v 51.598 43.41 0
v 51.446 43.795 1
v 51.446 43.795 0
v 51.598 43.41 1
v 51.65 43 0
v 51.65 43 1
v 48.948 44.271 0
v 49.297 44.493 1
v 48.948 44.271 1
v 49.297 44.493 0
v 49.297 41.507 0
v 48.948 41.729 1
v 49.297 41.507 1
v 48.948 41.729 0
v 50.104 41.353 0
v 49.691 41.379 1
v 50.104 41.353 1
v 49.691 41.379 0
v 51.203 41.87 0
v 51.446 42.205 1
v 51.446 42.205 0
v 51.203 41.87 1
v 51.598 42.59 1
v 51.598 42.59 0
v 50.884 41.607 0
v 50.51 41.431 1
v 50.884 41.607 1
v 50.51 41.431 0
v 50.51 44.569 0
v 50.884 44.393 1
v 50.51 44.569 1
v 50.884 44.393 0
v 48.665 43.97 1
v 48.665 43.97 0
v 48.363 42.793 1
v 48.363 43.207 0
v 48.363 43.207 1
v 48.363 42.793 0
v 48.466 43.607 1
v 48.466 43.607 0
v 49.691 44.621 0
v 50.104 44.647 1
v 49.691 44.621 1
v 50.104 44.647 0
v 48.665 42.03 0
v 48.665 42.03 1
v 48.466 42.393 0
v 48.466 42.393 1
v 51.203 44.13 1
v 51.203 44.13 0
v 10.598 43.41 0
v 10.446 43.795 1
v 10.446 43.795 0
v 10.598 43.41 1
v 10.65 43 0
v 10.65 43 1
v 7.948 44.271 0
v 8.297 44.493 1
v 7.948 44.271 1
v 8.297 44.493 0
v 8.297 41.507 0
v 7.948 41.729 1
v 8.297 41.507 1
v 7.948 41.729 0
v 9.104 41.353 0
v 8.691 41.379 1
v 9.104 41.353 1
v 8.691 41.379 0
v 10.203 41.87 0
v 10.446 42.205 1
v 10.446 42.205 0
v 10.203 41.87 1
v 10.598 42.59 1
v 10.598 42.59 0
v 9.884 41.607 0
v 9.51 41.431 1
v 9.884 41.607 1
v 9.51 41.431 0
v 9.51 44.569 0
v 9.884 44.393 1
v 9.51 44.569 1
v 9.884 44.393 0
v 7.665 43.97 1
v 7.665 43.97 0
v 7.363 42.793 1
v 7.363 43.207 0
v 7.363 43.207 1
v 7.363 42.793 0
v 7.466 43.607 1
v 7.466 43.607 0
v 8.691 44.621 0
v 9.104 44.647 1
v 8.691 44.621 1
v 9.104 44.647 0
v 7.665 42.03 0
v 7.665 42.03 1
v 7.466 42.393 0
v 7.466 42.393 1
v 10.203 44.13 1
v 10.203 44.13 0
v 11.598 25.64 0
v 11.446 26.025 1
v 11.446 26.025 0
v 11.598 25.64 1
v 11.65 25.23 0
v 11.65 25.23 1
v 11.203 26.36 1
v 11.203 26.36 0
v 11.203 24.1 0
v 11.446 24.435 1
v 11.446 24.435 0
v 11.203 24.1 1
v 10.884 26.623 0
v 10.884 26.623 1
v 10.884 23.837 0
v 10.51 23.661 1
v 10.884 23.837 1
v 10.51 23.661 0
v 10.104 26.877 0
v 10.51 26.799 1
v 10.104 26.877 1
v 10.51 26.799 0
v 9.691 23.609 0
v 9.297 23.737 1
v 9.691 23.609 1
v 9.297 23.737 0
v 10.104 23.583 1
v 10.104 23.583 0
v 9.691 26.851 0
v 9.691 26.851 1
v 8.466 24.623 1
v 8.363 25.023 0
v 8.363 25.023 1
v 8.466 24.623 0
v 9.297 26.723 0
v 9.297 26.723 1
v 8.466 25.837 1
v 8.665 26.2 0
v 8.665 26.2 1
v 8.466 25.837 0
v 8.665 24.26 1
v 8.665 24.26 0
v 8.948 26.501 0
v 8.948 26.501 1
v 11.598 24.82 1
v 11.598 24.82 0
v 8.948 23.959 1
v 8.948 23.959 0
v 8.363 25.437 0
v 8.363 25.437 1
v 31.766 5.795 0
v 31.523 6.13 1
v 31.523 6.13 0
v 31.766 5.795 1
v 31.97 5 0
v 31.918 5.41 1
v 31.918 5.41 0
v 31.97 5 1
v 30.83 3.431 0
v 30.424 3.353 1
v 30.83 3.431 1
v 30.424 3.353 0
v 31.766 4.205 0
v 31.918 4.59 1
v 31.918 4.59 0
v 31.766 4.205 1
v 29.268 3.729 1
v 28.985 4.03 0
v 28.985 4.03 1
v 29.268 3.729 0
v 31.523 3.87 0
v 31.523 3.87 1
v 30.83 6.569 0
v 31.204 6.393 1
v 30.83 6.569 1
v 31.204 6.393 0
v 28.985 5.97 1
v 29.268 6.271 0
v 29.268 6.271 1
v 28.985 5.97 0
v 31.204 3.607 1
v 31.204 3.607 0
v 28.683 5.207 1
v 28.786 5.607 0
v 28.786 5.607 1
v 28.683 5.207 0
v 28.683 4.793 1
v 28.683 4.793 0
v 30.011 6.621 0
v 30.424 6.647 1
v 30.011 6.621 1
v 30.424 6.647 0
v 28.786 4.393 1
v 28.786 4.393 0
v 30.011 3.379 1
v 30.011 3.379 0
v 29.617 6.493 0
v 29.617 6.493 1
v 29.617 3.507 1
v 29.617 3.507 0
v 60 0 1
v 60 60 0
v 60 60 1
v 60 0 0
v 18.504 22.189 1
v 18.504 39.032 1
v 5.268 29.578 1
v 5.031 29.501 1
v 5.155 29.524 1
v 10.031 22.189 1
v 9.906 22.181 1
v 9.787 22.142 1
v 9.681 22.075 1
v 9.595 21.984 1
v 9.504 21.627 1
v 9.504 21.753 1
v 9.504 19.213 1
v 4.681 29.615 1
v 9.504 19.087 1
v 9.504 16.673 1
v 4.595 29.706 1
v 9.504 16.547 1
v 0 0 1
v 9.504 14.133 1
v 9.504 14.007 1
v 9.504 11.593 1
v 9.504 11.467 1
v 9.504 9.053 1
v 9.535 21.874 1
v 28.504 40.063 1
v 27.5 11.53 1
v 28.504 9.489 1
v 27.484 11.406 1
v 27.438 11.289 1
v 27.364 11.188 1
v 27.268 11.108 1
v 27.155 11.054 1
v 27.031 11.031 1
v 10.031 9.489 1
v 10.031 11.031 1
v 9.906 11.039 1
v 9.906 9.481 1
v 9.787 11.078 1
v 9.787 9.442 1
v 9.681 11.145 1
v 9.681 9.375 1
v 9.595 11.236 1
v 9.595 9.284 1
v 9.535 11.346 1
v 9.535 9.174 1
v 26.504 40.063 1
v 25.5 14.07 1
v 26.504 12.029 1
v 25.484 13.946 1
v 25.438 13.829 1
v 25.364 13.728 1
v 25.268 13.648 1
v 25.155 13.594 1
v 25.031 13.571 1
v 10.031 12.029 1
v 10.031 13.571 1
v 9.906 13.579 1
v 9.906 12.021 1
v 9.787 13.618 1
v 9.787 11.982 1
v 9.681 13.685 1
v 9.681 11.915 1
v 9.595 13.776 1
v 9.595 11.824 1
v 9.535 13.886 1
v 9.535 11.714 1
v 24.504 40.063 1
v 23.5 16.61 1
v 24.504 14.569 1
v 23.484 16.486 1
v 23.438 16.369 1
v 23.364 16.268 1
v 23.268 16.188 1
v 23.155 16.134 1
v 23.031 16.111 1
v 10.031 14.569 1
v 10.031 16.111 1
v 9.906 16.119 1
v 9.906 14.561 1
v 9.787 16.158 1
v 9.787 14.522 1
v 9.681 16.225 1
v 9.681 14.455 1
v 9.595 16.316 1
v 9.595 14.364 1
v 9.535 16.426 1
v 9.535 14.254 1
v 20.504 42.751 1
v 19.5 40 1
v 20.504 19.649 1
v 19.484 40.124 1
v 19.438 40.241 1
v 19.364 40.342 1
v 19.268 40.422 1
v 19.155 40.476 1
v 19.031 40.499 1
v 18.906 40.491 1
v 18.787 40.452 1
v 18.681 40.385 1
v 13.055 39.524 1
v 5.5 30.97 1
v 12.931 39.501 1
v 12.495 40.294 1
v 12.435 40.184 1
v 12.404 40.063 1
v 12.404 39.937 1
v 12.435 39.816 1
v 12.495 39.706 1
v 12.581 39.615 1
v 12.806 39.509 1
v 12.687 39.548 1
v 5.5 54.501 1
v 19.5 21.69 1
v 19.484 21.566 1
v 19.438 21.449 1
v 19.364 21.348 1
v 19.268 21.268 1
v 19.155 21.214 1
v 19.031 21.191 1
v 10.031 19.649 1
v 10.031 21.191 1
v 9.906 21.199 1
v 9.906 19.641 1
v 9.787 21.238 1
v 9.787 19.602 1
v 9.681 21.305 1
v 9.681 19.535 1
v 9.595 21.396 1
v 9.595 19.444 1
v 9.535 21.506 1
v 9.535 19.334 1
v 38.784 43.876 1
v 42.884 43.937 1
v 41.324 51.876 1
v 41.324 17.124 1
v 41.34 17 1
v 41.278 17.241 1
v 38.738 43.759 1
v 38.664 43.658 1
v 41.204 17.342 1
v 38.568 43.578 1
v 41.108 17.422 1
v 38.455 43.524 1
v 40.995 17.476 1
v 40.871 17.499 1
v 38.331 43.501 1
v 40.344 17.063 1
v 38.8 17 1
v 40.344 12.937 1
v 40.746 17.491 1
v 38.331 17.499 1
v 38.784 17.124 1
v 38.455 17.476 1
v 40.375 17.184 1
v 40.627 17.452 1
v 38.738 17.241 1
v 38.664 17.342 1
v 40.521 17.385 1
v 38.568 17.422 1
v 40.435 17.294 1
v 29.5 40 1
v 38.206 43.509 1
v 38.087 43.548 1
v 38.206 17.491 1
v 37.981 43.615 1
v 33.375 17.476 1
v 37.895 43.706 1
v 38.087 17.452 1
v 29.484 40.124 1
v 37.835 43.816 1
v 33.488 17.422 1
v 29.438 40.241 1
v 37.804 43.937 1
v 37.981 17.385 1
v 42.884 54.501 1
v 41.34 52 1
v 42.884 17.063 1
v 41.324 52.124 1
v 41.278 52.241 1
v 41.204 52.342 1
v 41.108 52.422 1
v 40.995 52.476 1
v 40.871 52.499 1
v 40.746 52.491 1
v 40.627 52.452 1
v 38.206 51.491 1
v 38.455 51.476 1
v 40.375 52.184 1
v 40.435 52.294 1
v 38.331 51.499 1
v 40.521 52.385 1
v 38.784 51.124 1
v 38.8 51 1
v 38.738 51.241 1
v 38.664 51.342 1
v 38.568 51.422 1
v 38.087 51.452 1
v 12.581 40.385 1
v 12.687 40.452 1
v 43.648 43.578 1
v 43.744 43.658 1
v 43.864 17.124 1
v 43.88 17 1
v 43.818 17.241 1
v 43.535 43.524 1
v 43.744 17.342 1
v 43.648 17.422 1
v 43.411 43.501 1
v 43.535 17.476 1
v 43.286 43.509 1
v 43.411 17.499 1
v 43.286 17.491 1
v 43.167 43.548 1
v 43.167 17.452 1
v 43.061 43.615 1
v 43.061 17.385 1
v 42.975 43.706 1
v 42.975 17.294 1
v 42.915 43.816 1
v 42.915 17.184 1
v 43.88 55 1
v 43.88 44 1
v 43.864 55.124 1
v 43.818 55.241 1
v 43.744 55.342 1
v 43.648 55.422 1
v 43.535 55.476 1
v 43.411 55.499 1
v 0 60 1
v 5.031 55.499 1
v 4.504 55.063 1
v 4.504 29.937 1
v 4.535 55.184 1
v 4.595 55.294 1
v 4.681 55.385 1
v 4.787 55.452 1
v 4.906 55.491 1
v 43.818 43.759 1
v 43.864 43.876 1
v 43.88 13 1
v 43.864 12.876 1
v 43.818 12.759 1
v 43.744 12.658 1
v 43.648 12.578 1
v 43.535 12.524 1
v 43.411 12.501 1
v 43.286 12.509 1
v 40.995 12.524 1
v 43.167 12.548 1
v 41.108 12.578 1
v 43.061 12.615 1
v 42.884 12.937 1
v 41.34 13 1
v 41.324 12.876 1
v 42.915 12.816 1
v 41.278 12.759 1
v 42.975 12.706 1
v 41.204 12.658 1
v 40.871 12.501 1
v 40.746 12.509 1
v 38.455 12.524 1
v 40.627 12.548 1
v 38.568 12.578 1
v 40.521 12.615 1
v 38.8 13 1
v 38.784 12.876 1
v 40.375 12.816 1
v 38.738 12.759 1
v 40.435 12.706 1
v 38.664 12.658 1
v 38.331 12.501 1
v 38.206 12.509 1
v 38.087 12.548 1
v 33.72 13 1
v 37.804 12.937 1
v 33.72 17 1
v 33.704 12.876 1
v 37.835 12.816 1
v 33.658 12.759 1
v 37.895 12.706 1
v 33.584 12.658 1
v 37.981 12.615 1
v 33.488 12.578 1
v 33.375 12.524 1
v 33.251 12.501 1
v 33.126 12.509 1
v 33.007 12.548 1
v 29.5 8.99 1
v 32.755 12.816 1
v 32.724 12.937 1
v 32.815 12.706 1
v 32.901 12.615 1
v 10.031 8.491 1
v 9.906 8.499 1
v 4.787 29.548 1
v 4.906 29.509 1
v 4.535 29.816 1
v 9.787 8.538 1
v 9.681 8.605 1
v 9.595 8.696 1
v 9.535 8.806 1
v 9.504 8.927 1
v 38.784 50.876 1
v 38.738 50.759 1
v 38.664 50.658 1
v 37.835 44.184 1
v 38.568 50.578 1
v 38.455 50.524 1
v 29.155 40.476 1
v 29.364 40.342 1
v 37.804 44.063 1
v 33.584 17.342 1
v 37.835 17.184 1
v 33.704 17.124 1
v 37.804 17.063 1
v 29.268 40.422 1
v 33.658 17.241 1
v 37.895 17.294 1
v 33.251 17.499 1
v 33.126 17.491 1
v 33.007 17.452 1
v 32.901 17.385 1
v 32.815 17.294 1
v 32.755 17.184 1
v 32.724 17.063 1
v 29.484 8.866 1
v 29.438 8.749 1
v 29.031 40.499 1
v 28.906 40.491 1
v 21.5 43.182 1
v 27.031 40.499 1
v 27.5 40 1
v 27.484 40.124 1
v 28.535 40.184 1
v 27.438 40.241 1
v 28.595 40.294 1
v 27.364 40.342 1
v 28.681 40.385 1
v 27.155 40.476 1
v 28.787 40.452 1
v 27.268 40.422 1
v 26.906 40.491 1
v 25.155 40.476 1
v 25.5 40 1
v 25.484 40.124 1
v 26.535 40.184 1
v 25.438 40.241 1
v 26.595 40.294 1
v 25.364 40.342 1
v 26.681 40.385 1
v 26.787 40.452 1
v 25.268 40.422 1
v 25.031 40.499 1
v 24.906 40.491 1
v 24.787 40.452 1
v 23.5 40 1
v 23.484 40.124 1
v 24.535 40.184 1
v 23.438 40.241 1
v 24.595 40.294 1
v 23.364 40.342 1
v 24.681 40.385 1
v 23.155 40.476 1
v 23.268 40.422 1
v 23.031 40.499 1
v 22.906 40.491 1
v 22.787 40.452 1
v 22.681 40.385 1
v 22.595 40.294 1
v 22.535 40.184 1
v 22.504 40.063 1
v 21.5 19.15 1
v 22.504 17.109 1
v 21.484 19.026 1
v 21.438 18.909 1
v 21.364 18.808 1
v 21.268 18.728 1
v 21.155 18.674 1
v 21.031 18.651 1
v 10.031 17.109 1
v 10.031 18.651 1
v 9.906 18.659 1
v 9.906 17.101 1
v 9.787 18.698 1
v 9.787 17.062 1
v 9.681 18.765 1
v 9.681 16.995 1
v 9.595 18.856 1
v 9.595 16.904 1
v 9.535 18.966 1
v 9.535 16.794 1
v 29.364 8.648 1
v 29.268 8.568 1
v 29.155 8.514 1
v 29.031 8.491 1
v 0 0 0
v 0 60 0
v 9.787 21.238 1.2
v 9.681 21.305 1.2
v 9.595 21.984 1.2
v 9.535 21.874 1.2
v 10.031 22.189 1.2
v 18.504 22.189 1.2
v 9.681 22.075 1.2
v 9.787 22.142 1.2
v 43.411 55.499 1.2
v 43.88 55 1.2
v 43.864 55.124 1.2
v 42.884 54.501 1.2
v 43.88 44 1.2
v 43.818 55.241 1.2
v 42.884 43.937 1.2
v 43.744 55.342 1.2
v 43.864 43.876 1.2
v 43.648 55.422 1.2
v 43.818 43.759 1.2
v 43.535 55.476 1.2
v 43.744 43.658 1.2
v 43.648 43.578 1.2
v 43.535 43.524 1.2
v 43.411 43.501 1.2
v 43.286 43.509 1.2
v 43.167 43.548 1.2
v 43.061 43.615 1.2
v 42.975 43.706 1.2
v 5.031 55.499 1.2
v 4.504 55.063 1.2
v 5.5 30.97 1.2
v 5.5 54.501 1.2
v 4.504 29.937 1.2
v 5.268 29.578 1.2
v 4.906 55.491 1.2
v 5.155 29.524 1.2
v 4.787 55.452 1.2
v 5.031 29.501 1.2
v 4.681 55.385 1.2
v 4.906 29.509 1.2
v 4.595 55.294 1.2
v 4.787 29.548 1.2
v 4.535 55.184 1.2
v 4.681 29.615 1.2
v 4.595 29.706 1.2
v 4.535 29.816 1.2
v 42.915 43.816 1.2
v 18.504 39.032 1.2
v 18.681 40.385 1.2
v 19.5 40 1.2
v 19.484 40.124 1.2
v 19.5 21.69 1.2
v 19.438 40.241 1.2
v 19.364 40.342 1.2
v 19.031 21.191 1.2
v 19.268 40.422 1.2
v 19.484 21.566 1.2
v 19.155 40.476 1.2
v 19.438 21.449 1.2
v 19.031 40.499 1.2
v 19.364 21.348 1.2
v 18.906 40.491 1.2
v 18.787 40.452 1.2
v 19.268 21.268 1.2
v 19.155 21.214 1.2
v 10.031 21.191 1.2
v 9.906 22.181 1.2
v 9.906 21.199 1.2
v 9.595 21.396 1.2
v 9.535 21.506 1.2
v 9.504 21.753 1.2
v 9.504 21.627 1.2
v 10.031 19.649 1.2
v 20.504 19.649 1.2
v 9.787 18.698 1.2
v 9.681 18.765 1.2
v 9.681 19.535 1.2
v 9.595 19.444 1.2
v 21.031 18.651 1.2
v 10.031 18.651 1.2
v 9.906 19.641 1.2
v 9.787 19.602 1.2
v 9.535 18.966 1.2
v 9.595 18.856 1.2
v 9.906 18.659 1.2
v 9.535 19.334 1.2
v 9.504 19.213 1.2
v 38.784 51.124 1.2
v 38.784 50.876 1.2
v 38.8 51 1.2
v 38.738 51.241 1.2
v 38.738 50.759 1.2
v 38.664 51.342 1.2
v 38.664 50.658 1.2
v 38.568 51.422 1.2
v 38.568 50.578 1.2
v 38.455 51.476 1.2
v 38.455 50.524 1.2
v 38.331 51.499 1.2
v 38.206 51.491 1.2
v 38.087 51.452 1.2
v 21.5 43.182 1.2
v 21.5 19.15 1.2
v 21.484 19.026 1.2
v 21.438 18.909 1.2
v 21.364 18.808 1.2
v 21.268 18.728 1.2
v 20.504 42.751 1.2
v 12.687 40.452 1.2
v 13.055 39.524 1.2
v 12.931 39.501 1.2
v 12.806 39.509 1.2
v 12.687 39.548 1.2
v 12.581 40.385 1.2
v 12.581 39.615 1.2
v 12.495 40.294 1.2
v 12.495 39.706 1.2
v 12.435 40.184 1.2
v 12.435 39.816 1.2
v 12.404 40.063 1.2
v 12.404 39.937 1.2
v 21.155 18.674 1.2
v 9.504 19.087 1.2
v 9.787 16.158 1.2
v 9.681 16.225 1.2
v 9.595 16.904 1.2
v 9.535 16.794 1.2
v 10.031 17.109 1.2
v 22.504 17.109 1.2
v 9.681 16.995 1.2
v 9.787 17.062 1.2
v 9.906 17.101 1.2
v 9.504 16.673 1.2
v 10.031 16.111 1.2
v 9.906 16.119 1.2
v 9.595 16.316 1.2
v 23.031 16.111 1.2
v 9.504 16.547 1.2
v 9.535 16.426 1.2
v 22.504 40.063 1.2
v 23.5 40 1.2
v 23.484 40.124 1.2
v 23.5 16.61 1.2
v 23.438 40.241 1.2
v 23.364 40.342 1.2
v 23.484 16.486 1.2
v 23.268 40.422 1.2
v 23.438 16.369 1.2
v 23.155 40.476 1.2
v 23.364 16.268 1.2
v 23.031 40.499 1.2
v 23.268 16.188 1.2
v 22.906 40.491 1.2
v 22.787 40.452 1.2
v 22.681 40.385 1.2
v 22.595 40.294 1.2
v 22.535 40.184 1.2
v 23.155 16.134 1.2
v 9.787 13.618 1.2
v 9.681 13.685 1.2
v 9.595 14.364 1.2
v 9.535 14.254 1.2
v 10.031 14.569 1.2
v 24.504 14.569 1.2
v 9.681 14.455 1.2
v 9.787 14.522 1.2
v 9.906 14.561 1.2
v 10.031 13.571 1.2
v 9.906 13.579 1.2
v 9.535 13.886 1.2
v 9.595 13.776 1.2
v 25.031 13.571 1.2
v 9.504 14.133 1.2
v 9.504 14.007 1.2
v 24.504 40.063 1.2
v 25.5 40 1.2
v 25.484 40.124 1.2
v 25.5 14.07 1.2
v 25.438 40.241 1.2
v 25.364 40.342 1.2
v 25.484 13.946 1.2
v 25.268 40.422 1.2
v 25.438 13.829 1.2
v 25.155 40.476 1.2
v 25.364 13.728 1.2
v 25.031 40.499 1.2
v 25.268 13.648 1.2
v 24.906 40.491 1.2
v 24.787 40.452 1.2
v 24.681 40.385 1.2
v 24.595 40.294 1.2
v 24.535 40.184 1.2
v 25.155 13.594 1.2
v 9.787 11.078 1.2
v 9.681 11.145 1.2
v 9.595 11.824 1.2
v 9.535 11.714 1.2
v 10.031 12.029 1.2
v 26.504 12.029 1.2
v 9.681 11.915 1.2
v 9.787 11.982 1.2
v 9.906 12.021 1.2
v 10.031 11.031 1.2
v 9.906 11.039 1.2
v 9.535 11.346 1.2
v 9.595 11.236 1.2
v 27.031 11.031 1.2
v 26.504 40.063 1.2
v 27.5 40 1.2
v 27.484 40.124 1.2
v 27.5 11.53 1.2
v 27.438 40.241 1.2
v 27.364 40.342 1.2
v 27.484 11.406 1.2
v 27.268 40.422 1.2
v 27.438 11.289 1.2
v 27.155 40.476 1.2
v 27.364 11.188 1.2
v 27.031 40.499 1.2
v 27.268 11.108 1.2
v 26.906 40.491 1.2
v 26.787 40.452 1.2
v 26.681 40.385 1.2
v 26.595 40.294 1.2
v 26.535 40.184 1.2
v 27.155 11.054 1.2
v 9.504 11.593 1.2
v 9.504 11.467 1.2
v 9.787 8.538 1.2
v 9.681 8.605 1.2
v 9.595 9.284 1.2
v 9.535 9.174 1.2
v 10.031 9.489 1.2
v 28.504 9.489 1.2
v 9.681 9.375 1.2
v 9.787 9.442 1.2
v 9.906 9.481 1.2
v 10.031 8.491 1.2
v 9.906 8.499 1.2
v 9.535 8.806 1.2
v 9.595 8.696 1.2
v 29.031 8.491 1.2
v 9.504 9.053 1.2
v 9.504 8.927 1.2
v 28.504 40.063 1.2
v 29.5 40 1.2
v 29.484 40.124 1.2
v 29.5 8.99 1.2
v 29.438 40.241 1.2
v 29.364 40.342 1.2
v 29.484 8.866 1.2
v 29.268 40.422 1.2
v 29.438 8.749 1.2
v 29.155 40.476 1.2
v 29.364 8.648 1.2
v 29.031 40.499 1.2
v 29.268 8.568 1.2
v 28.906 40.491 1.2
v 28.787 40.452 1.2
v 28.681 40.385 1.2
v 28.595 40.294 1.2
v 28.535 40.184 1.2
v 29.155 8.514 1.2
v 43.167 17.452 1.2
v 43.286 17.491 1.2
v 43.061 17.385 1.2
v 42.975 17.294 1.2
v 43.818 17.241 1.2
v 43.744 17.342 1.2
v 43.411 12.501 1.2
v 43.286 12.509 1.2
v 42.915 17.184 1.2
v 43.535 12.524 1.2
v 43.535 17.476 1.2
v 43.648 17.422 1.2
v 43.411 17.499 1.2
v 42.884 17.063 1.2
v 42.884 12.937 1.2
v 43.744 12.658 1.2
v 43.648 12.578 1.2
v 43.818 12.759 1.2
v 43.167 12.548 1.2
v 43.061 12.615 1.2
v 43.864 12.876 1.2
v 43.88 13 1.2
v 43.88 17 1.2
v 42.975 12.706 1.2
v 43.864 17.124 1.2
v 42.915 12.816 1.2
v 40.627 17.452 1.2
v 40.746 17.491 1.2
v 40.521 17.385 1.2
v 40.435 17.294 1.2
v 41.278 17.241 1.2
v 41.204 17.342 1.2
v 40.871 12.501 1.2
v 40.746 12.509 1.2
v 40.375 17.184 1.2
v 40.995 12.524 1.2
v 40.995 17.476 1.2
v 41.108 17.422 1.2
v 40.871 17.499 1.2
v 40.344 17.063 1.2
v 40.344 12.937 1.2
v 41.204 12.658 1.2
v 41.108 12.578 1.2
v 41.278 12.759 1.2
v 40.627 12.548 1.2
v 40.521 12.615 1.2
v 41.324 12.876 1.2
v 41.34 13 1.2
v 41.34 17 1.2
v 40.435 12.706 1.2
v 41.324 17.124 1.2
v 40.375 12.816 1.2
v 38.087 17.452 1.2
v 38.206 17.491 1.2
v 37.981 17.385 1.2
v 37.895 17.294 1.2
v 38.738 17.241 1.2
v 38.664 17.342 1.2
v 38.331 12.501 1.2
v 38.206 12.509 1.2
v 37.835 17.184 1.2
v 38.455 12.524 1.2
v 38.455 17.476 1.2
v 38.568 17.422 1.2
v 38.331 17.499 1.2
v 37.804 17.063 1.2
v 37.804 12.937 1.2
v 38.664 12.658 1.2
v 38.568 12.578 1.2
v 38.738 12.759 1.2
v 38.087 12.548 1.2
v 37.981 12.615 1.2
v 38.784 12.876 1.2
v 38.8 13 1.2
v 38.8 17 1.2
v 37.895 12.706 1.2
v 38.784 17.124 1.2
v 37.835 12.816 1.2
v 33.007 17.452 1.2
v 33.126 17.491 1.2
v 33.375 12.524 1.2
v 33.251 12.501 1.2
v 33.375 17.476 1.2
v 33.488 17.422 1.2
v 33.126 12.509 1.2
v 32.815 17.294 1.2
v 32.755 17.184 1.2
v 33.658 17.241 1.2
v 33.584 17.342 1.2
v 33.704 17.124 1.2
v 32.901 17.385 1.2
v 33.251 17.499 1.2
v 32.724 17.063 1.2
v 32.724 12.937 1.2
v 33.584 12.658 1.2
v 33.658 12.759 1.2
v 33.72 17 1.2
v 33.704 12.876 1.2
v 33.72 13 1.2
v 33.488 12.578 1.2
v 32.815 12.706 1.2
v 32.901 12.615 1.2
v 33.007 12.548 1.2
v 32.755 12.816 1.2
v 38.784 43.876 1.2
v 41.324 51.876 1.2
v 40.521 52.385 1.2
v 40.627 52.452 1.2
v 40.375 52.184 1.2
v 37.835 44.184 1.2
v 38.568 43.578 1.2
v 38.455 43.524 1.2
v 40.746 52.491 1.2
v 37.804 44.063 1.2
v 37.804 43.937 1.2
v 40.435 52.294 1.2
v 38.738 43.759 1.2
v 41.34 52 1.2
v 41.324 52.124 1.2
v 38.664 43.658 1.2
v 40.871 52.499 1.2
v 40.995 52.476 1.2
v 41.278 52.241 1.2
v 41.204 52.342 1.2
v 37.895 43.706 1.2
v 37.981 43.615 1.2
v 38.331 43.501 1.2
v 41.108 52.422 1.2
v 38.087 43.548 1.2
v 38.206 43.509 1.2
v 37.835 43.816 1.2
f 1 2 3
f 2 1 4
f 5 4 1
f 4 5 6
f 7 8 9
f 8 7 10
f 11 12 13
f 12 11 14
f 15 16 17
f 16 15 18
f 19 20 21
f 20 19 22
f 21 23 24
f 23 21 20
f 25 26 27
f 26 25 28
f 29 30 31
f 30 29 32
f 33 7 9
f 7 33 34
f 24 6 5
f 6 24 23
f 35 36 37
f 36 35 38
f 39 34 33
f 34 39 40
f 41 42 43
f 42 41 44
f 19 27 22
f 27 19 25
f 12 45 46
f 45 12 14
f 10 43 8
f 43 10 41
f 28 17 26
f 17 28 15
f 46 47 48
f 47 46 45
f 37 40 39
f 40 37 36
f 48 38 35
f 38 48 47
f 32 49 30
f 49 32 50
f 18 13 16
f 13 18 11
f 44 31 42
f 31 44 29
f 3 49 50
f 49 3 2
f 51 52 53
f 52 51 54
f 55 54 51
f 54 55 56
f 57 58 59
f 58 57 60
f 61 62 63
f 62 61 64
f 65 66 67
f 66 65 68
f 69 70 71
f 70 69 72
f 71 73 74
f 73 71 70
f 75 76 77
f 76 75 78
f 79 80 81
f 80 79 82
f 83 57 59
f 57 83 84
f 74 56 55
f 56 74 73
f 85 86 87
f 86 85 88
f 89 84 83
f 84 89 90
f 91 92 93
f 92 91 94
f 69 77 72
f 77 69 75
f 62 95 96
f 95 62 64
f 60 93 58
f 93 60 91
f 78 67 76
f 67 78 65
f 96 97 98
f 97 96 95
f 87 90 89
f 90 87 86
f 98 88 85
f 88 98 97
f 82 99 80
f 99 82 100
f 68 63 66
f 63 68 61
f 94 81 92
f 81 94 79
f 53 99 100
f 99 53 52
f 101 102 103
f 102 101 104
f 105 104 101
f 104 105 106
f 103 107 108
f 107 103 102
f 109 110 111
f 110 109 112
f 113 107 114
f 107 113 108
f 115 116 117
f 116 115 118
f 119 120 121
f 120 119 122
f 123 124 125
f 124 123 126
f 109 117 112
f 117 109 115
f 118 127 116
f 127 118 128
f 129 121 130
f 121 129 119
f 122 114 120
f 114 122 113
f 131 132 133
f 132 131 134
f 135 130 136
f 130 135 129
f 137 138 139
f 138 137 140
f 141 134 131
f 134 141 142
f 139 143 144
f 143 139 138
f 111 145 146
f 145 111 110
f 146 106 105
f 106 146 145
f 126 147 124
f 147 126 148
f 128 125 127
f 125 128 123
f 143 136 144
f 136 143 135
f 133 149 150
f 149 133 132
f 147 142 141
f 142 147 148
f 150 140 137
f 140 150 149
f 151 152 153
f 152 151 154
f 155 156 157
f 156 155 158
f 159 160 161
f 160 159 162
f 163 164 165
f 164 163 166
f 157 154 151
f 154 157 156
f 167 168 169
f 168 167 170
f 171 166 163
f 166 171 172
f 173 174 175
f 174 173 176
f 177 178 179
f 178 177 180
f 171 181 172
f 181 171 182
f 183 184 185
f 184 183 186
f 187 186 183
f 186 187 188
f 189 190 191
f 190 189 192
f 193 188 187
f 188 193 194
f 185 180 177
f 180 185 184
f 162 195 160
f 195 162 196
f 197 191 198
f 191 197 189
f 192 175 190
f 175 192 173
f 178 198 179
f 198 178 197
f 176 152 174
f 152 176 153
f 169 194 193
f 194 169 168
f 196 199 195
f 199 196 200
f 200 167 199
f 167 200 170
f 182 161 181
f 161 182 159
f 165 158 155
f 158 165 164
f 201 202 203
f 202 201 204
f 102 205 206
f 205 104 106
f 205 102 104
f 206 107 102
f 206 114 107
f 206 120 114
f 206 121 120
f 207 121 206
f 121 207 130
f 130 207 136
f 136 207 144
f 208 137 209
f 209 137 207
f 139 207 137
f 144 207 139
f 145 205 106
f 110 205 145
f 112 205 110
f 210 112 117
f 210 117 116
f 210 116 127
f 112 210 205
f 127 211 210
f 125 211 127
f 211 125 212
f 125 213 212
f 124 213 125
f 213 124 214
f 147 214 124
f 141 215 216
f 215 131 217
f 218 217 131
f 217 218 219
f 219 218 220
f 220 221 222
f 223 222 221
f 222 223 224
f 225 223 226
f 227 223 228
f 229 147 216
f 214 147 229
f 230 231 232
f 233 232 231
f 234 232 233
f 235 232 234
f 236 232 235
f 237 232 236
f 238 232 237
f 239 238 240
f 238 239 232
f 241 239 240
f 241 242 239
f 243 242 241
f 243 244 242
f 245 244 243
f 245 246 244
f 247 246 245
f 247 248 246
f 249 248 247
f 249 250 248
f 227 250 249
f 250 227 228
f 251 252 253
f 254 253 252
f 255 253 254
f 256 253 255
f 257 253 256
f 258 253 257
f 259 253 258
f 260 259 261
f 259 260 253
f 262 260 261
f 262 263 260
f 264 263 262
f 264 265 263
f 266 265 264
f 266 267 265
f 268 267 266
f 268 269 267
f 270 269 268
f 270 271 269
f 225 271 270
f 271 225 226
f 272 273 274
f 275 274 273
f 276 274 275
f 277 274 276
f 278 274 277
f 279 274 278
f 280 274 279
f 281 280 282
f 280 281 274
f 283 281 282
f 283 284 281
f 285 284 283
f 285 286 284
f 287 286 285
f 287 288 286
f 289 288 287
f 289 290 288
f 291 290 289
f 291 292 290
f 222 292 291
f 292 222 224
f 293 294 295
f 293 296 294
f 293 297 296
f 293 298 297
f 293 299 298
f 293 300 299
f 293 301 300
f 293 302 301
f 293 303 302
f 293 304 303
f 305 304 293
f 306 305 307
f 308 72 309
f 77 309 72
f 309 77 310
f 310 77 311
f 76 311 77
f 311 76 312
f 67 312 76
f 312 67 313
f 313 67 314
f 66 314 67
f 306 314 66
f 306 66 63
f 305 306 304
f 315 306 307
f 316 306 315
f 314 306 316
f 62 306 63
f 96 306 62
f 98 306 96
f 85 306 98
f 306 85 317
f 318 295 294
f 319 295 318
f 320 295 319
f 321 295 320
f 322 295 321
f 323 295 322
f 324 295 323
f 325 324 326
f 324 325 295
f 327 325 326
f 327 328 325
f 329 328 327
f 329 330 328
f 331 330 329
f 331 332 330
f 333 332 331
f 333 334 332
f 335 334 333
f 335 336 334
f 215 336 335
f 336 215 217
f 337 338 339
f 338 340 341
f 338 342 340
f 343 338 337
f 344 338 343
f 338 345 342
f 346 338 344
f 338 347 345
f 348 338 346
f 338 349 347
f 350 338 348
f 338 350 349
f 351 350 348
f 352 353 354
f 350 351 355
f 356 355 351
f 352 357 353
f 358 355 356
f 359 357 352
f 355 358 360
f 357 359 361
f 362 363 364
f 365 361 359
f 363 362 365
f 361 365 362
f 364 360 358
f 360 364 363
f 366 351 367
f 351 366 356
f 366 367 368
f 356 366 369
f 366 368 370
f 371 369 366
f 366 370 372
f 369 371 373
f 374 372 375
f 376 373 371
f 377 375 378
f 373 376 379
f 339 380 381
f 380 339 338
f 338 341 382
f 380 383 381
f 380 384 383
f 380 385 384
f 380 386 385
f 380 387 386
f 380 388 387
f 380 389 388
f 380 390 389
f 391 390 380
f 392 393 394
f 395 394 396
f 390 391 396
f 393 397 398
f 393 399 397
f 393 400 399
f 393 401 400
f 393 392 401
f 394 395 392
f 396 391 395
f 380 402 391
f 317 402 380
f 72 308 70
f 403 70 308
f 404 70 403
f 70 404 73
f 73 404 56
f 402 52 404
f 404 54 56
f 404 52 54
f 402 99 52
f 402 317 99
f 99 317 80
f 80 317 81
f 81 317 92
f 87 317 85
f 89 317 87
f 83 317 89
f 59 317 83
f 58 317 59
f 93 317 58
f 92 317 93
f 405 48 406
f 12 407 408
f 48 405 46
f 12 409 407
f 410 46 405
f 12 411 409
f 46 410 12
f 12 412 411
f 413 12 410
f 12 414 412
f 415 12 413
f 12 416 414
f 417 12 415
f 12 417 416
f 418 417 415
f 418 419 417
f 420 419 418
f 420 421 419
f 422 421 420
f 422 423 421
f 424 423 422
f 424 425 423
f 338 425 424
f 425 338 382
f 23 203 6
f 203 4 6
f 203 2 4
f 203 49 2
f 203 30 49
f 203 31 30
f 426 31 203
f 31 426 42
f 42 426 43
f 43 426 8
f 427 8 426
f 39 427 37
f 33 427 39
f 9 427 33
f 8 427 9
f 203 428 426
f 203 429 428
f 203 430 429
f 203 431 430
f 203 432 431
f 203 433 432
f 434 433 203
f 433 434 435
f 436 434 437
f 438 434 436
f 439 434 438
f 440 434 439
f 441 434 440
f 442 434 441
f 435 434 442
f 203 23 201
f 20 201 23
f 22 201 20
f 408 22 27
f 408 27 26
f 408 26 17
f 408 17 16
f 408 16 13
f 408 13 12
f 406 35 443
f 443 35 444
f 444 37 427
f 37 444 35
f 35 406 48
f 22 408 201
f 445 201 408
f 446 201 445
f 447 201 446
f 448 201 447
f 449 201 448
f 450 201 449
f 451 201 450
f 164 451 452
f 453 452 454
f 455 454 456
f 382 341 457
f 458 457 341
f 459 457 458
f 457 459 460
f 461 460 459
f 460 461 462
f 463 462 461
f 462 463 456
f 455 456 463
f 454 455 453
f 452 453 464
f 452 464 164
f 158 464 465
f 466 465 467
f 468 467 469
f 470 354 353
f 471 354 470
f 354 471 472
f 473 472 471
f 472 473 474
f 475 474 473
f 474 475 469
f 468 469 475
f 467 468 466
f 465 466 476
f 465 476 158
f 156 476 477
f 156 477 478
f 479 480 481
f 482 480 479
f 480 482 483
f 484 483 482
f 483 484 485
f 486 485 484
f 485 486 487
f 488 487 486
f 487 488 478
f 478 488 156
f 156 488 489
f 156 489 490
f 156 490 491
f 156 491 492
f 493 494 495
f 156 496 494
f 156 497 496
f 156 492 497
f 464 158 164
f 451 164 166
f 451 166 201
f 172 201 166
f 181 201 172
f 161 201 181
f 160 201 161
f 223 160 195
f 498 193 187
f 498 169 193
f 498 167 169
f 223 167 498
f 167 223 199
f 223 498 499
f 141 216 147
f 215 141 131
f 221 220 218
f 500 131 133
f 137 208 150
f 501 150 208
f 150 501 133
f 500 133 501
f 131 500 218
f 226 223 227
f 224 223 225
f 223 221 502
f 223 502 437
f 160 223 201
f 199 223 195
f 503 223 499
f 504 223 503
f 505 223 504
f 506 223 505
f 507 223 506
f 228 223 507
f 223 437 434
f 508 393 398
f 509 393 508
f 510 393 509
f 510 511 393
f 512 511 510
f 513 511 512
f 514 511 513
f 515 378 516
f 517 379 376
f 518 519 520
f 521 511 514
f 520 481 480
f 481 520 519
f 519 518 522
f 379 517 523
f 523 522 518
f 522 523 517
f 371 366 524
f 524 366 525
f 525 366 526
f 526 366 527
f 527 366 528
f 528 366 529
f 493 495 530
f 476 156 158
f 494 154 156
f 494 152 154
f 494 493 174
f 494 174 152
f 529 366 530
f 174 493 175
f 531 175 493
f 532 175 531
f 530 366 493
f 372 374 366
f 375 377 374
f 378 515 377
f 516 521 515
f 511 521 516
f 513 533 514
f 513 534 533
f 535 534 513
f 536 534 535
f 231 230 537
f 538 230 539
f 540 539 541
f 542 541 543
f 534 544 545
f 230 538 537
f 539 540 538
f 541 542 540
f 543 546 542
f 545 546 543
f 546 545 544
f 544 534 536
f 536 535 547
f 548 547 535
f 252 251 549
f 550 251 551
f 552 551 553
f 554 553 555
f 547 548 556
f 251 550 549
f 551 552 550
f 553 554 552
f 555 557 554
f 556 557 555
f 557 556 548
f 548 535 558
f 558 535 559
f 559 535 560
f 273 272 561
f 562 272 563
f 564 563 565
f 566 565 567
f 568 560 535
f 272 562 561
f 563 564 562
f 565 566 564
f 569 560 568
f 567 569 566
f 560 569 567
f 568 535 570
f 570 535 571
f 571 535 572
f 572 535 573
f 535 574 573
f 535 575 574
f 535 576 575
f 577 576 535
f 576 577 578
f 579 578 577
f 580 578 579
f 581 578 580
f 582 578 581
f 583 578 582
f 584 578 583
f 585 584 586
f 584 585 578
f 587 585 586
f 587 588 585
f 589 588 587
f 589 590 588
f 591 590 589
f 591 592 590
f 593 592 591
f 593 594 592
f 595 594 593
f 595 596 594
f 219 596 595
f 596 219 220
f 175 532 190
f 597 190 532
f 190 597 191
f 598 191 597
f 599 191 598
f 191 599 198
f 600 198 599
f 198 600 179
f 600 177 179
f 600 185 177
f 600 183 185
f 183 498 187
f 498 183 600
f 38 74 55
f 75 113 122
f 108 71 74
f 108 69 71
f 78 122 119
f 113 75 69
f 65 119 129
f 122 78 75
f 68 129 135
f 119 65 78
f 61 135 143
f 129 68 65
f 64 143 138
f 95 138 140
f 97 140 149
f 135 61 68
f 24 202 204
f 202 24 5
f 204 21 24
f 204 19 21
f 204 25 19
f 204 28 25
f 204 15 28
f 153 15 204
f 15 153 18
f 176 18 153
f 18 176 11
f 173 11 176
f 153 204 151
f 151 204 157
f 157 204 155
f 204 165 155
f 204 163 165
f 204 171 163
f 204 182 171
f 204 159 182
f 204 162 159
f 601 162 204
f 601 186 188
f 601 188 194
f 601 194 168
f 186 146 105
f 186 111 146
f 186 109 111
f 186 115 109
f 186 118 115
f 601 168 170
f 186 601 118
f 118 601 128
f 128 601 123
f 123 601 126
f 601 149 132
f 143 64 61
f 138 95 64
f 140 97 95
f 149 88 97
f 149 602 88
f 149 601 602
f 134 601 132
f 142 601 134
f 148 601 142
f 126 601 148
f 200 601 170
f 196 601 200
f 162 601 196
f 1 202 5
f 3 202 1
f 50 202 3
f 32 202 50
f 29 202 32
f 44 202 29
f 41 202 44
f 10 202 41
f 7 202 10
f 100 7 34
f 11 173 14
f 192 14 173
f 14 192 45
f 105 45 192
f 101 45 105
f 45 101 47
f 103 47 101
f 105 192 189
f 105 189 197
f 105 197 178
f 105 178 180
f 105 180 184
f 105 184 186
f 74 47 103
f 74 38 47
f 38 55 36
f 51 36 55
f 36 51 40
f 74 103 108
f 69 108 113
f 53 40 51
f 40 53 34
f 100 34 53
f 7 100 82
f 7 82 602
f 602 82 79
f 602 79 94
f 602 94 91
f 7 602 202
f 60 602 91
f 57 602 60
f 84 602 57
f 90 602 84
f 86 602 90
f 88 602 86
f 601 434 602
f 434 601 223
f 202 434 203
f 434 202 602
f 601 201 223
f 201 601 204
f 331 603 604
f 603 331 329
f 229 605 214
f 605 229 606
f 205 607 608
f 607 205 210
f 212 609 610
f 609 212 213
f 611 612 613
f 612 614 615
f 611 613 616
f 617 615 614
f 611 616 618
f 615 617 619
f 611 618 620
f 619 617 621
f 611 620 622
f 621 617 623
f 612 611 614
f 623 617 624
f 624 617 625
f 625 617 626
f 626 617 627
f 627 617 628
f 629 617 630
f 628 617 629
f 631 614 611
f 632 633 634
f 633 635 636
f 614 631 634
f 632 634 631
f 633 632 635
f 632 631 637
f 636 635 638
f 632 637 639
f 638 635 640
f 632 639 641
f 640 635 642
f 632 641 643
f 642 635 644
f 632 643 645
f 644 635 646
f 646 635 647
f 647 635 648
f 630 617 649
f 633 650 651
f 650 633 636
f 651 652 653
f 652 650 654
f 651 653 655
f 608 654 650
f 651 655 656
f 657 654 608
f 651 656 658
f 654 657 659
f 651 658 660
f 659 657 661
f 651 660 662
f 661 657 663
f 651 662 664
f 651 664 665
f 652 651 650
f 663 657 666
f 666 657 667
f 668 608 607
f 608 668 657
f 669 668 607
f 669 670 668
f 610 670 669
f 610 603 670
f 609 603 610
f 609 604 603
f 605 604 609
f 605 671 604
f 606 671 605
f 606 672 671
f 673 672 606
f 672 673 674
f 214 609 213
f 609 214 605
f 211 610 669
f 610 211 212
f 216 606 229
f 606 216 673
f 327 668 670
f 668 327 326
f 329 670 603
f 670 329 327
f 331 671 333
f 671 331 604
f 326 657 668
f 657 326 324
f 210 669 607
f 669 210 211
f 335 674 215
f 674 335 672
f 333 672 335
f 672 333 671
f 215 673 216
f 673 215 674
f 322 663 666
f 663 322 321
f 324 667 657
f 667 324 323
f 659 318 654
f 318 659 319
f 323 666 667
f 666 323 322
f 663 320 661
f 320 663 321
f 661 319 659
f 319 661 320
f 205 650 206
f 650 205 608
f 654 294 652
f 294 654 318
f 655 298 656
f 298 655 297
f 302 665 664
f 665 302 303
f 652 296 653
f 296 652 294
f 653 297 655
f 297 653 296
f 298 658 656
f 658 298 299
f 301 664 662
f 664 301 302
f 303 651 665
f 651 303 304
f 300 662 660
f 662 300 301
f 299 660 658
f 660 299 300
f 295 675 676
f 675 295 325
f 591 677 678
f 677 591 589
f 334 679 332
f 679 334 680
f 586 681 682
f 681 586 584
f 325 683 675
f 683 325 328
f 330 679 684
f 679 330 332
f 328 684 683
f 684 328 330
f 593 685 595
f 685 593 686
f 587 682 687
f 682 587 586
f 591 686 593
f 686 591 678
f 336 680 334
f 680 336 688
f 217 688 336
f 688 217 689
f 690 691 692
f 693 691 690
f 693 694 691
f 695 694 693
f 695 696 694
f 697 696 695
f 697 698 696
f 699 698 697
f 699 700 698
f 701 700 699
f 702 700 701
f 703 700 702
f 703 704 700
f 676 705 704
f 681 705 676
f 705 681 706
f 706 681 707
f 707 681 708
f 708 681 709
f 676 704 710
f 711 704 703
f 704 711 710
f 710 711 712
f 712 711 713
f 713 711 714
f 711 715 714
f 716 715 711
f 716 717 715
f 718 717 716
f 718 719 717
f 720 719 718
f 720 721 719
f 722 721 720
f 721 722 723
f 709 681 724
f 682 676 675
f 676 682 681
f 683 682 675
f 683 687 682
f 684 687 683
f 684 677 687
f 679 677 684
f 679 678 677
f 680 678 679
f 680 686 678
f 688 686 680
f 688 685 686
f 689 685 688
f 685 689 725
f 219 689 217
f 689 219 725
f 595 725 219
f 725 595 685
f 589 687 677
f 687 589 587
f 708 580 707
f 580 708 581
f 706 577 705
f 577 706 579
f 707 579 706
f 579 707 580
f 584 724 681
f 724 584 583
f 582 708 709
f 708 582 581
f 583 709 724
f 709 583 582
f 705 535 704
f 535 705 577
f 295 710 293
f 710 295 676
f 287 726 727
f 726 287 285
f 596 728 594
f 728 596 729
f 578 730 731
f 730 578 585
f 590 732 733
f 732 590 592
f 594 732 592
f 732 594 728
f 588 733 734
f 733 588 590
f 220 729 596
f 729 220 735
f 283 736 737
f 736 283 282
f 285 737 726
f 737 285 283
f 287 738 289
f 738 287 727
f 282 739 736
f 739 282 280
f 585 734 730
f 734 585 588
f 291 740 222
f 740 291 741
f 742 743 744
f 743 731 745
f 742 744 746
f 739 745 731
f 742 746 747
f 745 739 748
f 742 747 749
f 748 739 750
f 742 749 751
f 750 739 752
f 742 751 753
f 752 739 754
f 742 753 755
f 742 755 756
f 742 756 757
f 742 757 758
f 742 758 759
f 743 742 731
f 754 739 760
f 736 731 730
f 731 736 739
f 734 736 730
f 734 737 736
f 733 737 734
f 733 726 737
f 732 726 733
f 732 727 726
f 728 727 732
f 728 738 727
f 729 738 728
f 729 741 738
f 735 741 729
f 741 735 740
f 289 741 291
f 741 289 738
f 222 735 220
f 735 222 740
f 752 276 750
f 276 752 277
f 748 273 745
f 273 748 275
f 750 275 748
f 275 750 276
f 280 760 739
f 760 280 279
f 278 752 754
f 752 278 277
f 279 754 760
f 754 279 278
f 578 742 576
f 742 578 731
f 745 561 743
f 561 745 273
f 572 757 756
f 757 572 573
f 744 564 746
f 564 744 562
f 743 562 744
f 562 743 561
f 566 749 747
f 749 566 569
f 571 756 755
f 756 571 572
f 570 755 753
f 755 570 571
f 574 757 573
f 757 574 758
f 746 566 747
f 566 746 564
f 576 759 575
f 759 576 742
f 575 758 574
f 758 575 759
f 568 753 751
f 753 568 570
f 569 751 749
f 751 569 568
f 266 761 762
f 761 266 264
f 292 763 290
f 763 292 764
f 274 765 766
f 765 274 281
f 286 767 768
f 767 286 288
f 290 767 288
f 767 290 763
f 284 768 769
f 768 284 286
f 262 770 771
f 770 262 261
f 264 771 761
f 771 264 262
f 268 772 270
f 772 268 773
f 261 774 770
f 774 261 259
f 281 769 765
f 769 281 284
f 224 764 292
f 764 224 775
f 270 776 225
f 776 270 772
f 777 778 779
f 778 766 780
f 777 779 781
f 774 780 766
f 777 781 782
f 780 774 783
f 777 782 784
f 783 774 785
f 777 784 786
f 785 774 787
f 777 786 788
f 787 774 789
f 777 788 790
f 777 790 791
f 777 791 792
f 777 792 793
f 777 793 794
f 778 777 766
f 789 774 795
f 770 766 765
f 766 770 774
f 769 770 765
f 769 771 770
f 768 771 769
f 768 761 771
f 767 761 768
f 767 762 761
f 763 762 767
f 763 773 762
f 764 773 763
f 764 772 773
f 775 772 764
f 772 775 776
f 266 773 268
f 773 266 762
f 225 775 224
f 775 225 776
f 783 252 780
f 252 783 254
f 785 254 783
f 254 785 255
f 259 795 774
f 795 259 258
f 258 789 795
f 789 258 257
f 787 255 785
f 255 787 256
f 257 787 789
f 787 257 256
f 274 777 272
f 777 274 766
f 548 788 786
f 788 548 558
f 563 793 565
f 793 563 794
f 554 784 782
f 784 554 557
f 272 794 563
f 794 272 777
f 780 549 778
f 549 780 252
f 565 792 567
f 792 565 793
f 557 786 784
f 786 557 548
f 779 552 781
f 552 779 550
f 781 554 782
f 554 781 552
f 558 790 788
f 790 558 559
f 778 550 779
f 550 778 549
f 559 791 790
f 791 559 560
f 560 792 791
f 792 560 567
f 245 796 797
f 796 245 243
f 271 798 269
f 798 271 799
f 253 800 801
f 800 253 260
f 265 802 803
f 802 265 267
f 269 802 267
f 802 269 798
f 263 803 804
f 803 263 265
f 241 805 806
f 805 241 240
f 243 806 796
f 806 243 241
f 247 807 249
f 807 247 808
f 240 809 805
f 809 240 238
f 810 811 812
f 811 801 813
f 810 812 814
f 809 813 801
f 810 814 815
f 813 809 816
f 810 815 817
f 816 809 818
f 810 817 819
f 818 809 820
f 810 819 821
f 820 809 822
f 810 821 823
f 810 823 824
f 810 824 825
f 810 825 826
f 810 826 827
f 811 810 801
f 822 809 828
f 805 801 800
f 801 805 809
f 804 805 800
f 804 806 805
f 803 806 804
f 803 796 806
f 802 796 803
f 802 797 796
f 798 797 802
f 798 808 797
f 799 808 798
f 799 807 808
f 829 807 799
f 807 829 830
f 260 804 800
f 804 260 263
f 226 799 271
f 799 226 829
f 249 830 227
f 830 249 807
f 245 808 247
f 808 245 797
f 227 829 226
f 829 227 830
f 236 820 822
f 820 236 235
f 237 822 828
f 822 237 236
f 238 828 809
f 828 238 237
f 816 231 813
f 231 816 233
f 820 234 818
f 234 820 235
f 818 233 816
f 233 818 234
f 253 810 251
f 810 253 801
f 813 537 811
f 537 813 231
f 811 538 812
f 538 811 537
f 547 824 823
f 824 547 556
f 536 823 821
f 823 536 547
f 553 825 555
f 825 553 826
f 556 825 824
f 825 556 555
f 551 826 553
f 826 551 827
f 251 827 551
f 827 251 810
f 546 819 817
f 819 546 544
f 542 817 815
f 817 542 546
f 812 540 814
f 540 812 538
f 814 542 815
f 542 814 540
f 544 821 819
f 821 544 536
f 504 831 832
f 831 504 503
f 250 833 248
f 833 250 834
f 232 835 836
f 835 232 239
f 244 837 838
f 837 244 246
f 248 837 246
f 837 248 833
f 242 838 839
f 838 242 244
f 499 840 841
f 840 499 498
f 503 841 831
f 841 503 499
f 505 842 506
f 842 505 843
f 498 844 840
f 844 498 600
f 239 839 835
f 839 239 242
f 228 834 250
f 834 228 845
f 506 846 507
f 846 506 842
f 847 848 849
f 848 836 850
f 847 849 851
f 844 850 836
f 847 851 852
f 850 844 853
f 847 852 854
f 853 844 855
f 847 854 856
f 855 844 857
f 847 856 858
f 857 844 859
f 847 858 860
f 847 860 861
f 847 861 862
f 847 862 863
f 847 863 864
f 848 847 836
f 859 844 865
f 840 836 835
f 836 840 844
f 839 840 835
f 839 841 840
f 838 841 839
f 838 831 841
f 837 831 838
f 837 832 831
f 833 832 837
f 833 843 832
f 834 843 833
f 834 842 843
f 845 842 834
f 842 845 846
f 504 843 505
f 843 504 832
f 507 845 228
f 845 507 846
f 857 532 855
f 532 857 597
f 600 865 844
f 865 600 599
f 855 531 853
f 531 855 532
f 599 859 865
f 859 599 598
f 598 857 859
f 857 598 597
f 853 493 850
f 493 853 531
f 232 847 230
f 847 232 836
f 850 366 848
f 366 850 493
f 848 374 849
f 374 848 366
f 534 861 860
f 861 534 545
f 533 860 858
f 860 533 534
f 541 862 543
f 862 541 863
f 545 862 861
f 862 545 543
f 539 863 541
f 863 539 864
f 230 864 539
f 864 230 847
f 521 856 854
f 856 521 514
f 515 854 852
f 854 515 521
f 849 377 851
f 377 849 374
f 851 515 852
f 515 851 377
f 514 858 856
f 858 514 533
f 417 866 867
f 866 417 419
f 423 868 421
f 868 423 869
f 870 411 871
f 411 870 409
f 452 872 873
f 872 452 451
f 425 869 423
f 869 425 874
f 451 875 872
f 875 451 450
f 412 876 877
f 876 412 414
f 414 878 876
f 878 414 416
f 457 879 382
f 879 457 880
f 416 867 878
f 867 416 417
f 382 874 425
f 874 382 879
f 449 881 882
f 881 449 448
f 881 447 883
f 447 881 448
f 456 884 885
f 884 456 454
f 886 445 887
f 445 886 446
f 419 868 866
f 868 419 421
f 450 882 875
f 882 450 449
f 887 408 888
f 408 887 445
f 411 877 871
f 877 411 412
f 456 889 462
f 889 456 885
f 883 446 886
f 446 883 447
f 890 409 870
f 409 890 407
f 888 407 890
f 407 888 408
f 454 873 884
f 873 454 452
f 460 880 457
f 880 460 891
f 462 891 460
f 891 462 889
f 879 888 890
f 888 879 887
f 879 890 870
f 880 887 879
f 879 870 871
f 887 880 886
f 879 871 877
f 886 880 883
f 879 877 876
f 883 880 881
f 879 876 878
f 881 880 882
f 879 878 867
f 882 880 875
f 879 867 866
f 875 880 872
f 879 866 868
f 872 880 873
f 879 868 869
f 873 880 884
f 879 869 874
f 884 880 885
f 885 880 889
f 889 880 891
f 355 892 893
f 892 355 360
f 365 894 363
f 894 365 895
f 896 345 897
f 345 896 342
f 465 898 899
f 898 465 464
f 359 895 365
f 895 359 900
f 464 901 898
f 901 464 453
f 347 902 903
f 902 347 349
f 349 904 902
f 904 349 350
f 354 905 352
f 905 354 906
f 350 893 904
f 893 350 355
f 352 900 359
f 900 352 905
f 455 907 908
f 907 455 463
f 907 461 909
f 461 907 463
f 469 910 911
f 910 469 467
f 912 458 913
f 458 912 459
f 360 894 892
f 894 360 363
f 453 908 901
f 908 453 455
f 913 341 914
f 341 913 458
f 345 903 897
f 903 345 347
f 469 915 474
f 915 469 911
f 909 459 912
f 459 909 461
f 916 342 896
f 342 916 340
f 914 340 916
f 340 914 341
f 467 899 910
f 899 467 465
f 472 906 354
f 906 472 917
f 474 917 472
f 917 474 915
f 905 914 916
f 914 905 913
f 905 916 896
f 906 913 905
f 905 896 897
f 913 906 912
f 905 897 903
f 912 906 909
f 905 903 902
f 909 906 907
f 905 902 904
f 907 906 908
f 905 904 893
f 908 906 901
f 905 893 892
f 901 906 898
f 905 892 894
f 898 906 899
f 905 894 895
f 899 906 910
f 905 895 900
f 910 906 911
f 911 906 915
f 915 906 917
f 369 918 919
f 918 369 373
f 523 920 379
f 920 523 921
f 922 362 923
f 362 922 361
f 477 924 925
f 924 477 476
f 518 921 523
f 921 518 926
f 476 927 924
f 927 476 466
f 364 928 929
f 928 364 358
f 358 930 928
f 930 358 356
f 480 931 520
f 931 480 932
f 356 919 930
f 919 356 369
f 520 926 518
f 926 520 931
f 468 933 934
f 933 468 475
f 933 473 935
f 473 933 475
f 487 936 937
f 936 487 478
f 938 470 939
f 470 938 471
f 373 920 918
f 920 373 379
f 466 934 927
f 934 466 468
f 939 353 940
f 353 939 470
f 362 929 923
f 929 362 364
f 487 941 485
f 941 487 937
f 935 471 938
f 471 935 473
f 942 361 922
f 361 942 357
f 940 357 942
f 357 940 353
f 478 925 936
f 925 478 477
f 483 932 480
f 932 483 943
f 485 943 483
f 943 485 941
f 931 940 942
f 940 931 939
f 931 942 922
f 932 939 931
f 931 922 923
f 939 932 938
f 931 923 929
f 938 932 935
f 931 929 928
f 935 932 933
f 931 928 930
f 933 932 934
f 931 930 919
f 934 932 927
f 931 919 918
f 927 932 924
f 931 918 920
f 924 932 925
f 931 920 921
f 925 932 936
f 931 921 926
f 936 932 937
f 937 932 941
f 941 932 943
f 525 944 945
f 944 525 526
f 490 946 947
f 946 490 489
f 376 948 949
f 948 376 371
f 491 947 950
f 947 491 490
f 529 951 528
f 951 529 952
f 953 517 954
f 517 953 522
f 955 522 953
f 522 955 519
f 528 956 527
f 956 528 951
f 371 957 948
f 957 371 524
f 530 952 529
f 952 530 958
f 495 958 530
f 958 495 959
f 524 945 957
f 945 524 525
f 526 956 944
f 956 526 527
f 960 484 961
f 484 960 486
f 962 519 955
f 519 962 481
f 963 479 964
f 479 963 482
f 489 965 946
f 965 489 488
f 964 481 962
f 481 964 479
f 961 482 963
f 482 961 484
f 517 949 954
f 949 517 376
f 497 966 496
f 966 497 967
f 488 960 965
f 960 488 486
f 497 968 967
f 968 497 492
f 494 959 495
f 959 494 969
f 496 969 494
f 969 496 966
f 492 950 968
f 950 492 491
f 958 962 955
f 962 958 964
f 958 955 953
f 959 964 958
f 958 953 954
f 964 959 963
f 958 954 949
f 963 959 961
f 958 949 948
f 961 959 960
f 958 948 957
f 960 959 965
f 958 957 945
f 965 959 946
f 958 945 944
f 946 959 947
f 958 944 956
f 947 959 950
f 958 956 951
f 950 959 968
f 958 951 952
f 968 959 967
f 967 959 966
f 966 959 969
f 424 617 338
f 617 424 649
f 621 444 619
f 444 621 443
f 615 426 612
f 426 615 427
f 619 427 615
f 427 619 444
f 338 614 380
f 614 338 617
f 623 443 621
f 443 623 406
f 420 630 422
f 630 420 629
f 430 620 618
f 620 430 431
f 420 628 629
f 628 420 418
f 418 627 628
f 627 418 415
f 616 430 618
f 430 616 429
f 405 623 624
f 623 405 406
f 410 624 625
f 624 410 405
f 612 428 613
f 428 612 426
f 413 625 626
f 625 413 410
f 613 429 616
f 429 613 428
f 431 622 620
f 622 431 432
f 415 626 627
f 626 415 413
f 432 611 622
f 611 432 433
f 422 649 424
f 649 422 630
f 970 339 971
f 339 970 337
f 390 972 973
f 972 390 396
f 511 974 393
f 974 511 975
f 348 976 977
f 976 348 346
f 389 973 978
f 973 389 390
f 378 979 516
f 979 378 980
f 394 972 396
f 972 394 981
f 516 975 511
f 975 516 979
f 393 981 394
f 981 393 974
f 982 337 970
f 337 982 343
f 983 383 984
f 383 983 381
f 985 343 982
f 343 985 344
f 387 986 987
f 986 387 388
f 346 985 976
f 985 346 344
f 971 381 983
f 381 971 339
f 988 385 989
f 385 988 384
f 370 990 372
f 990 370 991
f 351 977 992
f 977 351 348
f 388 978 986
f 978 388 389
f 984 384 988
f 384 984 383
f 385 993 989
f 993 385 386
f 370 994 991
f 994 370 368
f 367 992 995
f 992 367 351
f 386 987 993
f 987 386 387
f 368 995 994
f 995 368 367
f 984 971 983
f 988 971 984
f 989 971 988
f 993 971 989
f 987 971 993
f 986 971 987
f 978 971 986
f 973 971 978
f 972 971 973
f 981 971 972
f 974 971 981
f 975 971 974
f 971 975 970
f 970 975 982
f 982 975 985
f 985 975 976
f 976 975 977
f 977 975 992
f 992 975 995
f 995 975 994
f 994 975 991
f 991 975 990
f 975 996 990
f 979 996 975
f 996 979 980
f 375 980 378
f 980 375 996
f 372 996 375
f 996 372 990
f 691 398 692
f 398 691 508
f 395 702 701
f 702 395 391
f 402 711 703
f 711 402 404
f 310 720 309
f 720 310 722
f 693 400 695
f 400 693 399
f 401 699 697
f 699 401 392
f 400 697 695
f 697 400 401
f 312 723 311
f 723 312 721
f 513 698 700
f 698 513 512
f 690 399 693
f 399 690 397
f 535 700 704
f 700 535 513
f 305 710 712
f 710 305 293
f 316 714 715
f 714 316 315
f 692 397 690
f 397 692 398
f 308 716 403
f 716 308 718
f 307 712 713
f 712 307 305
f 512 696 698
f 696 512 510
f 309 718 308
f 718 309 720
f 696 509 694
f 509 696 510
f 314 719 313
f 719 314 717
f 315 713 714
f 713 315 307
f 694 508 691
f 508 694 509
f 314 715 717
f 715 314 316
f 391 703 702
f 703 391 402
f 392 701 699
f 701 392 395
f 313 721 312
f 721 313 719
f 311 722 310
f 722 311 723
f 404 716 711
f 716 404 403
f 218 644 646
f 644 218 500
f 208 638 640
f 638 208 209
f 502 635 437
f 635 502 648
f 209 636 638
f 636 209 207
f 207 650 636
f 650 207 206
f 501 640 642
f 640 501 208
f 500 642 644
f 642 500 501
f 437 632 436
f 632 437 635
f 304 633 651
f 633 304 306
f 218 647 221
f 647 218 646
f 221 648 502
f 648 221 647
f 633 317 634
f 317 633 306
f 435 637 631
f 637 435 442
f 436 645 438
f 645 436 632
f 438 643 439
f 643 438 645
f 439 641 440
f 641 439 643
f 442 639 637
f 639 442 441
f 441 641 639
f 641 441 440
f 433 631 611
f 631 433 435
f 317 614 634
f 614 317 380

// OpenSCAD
$fn = 25;
length = 60;
M3 = 1.65; // Hole radius for m3 hardware
SAE6 = 1.80; // Hole radius for 6-32 hardware
GPIO = 2.54; // gpio pin spacing
rowtx = 44; // arduino gpio row with tx dist. from edge r
rowvn = 20; // arduino gpio row with vn dist. from edge l.
module trace(p1,p2) {
    color([1,.7,.1]){hull() {
		w = .5;
        translate(p1) cylinder(r=w,h=1.2);
        translate(p2) cylinder(r=w,h=1.2);
    }}
}

difference(){
	union(){
		color([.2,.5,.3]){cube([60,60,1]);}
		}
		{

	color([0,0,1]){ //ARDUINO
	translate([length-10,60-17,-1])cylinder(h=10,r=M3);
	translate([length-51,60-17,-1])cylinder(h=10,r=M3);
		}
	//color([0,1,1]){ //GPS
	//translate([length-45,60-17,-1])cylinder(h=10,r=SAE6);
	//translate([length-20,60-17,-1])cylinder(h=10,r=SAE6);
	//}
	//color([1,0,1]){ //BME280
	//translate([length-36,10,2.1])cube([27,18,4.5]);
	//translate([length-29,11,-.1])cube([20,5,20]);
	//	}
	color([1,1,0]){// MICRO SD www.adafruit.com/product/254
	translate([10,      25.23,  -.01])cylinder(h=10,r=M3);
	translate([20.32+10,    5,    -1])cylinder(h=10,r=M3);
	}
	
	}
}
	
	
	
// TRACES START HERE (FEEL FREE TO CHANGE)
//	color([1,0,0])translate([23,55])cube([5,5,1.5]);
	//color([0,0,0])translate([15,55])cube([5,5,1.5]);
	
	//trace([25.5,55],[25.5,rowtx+2]);//power in to arduino
	//trace([25.5,rowtx+2],[6,rowtx+2]);//power in to arduino
	//trace([6,rowtx+2],[6,60-rowvn]);//power in to arduino
	//trace([6,60-rowvn],[15,60-rowvn]);//power in to arduino
	

	//trace([15.5,55],[15.5,rowtx+5]);//gnd to arduino
	//trace([15.5,rowtx+5],[3,rowtx+5]);//gnd in to arduino
	//trace([3,rowtx+5],[3,60-rowvn-3]);//gnd in to arduino
	//trace([3,60-rowvn-3],[15+GPIO,60-rowvn-3]);//gnd in to arduino
	//trace([15+GPIO,60-rowvn-3],[15+GPIO,60-rowvn]);//gnd in to arduino

	trace([51-(3*GPIO),17],[51-(3*GPIO),13]);//from gas to bme280 SCL
	trace([51-(4*GPIO),17],[51-(4*GPIO),13]);//from gas to bme280   SDA
	trace([51-(5*GPIO),17],[51-(5*GPIO),13]);//from gas to bme280 5v 
	trace([51-(7*GPIO),17],[51-(7*GPIO),13]);//from gas to bme280 gnd

	trace([51-(3*GPIO),55],[51-(3*GPIO),rowtx]);//gps > arduino gnd
	trace([51-(4*GPIO),52],[51-(5*GPIO),rowtx]);//gps > arduino rx
	trace([51-(5*GPIO),51],[51-(15*GPIO),60-rowvn]);//gps > arduino 3.3
	//trace([51-(6*GPIO),rowtx],[51-(5*GPIO),51]);//gps > arduino 3.3
	
	for ( i = [1:1:6]) {
	trace([10,24.23-(i*GPIO)],[13,24.23-(i*GPIO)]);//SD > Arduino
	trace([13,24.23-(i*GPIO)],[17+(i*2),24.23-(i*GPIO)]);//SD > Ar.
	trace([17+(i*2),24.23-(i*GPIO)],[17+(i*2),60-rowvn]);//SD > Ar.
		}
	trace([17+(1*2),60-rowvn],[5,30]); //SD GRD
	trace([5,30],[5,55]); //SD GRD
	trace([5,55],[51-(3*GPIO),55]); //SD GRD
		
	trace([17+(2*2),60-rowvn],[17+(2*2),63.5-rowvn]); //SD 3.3
